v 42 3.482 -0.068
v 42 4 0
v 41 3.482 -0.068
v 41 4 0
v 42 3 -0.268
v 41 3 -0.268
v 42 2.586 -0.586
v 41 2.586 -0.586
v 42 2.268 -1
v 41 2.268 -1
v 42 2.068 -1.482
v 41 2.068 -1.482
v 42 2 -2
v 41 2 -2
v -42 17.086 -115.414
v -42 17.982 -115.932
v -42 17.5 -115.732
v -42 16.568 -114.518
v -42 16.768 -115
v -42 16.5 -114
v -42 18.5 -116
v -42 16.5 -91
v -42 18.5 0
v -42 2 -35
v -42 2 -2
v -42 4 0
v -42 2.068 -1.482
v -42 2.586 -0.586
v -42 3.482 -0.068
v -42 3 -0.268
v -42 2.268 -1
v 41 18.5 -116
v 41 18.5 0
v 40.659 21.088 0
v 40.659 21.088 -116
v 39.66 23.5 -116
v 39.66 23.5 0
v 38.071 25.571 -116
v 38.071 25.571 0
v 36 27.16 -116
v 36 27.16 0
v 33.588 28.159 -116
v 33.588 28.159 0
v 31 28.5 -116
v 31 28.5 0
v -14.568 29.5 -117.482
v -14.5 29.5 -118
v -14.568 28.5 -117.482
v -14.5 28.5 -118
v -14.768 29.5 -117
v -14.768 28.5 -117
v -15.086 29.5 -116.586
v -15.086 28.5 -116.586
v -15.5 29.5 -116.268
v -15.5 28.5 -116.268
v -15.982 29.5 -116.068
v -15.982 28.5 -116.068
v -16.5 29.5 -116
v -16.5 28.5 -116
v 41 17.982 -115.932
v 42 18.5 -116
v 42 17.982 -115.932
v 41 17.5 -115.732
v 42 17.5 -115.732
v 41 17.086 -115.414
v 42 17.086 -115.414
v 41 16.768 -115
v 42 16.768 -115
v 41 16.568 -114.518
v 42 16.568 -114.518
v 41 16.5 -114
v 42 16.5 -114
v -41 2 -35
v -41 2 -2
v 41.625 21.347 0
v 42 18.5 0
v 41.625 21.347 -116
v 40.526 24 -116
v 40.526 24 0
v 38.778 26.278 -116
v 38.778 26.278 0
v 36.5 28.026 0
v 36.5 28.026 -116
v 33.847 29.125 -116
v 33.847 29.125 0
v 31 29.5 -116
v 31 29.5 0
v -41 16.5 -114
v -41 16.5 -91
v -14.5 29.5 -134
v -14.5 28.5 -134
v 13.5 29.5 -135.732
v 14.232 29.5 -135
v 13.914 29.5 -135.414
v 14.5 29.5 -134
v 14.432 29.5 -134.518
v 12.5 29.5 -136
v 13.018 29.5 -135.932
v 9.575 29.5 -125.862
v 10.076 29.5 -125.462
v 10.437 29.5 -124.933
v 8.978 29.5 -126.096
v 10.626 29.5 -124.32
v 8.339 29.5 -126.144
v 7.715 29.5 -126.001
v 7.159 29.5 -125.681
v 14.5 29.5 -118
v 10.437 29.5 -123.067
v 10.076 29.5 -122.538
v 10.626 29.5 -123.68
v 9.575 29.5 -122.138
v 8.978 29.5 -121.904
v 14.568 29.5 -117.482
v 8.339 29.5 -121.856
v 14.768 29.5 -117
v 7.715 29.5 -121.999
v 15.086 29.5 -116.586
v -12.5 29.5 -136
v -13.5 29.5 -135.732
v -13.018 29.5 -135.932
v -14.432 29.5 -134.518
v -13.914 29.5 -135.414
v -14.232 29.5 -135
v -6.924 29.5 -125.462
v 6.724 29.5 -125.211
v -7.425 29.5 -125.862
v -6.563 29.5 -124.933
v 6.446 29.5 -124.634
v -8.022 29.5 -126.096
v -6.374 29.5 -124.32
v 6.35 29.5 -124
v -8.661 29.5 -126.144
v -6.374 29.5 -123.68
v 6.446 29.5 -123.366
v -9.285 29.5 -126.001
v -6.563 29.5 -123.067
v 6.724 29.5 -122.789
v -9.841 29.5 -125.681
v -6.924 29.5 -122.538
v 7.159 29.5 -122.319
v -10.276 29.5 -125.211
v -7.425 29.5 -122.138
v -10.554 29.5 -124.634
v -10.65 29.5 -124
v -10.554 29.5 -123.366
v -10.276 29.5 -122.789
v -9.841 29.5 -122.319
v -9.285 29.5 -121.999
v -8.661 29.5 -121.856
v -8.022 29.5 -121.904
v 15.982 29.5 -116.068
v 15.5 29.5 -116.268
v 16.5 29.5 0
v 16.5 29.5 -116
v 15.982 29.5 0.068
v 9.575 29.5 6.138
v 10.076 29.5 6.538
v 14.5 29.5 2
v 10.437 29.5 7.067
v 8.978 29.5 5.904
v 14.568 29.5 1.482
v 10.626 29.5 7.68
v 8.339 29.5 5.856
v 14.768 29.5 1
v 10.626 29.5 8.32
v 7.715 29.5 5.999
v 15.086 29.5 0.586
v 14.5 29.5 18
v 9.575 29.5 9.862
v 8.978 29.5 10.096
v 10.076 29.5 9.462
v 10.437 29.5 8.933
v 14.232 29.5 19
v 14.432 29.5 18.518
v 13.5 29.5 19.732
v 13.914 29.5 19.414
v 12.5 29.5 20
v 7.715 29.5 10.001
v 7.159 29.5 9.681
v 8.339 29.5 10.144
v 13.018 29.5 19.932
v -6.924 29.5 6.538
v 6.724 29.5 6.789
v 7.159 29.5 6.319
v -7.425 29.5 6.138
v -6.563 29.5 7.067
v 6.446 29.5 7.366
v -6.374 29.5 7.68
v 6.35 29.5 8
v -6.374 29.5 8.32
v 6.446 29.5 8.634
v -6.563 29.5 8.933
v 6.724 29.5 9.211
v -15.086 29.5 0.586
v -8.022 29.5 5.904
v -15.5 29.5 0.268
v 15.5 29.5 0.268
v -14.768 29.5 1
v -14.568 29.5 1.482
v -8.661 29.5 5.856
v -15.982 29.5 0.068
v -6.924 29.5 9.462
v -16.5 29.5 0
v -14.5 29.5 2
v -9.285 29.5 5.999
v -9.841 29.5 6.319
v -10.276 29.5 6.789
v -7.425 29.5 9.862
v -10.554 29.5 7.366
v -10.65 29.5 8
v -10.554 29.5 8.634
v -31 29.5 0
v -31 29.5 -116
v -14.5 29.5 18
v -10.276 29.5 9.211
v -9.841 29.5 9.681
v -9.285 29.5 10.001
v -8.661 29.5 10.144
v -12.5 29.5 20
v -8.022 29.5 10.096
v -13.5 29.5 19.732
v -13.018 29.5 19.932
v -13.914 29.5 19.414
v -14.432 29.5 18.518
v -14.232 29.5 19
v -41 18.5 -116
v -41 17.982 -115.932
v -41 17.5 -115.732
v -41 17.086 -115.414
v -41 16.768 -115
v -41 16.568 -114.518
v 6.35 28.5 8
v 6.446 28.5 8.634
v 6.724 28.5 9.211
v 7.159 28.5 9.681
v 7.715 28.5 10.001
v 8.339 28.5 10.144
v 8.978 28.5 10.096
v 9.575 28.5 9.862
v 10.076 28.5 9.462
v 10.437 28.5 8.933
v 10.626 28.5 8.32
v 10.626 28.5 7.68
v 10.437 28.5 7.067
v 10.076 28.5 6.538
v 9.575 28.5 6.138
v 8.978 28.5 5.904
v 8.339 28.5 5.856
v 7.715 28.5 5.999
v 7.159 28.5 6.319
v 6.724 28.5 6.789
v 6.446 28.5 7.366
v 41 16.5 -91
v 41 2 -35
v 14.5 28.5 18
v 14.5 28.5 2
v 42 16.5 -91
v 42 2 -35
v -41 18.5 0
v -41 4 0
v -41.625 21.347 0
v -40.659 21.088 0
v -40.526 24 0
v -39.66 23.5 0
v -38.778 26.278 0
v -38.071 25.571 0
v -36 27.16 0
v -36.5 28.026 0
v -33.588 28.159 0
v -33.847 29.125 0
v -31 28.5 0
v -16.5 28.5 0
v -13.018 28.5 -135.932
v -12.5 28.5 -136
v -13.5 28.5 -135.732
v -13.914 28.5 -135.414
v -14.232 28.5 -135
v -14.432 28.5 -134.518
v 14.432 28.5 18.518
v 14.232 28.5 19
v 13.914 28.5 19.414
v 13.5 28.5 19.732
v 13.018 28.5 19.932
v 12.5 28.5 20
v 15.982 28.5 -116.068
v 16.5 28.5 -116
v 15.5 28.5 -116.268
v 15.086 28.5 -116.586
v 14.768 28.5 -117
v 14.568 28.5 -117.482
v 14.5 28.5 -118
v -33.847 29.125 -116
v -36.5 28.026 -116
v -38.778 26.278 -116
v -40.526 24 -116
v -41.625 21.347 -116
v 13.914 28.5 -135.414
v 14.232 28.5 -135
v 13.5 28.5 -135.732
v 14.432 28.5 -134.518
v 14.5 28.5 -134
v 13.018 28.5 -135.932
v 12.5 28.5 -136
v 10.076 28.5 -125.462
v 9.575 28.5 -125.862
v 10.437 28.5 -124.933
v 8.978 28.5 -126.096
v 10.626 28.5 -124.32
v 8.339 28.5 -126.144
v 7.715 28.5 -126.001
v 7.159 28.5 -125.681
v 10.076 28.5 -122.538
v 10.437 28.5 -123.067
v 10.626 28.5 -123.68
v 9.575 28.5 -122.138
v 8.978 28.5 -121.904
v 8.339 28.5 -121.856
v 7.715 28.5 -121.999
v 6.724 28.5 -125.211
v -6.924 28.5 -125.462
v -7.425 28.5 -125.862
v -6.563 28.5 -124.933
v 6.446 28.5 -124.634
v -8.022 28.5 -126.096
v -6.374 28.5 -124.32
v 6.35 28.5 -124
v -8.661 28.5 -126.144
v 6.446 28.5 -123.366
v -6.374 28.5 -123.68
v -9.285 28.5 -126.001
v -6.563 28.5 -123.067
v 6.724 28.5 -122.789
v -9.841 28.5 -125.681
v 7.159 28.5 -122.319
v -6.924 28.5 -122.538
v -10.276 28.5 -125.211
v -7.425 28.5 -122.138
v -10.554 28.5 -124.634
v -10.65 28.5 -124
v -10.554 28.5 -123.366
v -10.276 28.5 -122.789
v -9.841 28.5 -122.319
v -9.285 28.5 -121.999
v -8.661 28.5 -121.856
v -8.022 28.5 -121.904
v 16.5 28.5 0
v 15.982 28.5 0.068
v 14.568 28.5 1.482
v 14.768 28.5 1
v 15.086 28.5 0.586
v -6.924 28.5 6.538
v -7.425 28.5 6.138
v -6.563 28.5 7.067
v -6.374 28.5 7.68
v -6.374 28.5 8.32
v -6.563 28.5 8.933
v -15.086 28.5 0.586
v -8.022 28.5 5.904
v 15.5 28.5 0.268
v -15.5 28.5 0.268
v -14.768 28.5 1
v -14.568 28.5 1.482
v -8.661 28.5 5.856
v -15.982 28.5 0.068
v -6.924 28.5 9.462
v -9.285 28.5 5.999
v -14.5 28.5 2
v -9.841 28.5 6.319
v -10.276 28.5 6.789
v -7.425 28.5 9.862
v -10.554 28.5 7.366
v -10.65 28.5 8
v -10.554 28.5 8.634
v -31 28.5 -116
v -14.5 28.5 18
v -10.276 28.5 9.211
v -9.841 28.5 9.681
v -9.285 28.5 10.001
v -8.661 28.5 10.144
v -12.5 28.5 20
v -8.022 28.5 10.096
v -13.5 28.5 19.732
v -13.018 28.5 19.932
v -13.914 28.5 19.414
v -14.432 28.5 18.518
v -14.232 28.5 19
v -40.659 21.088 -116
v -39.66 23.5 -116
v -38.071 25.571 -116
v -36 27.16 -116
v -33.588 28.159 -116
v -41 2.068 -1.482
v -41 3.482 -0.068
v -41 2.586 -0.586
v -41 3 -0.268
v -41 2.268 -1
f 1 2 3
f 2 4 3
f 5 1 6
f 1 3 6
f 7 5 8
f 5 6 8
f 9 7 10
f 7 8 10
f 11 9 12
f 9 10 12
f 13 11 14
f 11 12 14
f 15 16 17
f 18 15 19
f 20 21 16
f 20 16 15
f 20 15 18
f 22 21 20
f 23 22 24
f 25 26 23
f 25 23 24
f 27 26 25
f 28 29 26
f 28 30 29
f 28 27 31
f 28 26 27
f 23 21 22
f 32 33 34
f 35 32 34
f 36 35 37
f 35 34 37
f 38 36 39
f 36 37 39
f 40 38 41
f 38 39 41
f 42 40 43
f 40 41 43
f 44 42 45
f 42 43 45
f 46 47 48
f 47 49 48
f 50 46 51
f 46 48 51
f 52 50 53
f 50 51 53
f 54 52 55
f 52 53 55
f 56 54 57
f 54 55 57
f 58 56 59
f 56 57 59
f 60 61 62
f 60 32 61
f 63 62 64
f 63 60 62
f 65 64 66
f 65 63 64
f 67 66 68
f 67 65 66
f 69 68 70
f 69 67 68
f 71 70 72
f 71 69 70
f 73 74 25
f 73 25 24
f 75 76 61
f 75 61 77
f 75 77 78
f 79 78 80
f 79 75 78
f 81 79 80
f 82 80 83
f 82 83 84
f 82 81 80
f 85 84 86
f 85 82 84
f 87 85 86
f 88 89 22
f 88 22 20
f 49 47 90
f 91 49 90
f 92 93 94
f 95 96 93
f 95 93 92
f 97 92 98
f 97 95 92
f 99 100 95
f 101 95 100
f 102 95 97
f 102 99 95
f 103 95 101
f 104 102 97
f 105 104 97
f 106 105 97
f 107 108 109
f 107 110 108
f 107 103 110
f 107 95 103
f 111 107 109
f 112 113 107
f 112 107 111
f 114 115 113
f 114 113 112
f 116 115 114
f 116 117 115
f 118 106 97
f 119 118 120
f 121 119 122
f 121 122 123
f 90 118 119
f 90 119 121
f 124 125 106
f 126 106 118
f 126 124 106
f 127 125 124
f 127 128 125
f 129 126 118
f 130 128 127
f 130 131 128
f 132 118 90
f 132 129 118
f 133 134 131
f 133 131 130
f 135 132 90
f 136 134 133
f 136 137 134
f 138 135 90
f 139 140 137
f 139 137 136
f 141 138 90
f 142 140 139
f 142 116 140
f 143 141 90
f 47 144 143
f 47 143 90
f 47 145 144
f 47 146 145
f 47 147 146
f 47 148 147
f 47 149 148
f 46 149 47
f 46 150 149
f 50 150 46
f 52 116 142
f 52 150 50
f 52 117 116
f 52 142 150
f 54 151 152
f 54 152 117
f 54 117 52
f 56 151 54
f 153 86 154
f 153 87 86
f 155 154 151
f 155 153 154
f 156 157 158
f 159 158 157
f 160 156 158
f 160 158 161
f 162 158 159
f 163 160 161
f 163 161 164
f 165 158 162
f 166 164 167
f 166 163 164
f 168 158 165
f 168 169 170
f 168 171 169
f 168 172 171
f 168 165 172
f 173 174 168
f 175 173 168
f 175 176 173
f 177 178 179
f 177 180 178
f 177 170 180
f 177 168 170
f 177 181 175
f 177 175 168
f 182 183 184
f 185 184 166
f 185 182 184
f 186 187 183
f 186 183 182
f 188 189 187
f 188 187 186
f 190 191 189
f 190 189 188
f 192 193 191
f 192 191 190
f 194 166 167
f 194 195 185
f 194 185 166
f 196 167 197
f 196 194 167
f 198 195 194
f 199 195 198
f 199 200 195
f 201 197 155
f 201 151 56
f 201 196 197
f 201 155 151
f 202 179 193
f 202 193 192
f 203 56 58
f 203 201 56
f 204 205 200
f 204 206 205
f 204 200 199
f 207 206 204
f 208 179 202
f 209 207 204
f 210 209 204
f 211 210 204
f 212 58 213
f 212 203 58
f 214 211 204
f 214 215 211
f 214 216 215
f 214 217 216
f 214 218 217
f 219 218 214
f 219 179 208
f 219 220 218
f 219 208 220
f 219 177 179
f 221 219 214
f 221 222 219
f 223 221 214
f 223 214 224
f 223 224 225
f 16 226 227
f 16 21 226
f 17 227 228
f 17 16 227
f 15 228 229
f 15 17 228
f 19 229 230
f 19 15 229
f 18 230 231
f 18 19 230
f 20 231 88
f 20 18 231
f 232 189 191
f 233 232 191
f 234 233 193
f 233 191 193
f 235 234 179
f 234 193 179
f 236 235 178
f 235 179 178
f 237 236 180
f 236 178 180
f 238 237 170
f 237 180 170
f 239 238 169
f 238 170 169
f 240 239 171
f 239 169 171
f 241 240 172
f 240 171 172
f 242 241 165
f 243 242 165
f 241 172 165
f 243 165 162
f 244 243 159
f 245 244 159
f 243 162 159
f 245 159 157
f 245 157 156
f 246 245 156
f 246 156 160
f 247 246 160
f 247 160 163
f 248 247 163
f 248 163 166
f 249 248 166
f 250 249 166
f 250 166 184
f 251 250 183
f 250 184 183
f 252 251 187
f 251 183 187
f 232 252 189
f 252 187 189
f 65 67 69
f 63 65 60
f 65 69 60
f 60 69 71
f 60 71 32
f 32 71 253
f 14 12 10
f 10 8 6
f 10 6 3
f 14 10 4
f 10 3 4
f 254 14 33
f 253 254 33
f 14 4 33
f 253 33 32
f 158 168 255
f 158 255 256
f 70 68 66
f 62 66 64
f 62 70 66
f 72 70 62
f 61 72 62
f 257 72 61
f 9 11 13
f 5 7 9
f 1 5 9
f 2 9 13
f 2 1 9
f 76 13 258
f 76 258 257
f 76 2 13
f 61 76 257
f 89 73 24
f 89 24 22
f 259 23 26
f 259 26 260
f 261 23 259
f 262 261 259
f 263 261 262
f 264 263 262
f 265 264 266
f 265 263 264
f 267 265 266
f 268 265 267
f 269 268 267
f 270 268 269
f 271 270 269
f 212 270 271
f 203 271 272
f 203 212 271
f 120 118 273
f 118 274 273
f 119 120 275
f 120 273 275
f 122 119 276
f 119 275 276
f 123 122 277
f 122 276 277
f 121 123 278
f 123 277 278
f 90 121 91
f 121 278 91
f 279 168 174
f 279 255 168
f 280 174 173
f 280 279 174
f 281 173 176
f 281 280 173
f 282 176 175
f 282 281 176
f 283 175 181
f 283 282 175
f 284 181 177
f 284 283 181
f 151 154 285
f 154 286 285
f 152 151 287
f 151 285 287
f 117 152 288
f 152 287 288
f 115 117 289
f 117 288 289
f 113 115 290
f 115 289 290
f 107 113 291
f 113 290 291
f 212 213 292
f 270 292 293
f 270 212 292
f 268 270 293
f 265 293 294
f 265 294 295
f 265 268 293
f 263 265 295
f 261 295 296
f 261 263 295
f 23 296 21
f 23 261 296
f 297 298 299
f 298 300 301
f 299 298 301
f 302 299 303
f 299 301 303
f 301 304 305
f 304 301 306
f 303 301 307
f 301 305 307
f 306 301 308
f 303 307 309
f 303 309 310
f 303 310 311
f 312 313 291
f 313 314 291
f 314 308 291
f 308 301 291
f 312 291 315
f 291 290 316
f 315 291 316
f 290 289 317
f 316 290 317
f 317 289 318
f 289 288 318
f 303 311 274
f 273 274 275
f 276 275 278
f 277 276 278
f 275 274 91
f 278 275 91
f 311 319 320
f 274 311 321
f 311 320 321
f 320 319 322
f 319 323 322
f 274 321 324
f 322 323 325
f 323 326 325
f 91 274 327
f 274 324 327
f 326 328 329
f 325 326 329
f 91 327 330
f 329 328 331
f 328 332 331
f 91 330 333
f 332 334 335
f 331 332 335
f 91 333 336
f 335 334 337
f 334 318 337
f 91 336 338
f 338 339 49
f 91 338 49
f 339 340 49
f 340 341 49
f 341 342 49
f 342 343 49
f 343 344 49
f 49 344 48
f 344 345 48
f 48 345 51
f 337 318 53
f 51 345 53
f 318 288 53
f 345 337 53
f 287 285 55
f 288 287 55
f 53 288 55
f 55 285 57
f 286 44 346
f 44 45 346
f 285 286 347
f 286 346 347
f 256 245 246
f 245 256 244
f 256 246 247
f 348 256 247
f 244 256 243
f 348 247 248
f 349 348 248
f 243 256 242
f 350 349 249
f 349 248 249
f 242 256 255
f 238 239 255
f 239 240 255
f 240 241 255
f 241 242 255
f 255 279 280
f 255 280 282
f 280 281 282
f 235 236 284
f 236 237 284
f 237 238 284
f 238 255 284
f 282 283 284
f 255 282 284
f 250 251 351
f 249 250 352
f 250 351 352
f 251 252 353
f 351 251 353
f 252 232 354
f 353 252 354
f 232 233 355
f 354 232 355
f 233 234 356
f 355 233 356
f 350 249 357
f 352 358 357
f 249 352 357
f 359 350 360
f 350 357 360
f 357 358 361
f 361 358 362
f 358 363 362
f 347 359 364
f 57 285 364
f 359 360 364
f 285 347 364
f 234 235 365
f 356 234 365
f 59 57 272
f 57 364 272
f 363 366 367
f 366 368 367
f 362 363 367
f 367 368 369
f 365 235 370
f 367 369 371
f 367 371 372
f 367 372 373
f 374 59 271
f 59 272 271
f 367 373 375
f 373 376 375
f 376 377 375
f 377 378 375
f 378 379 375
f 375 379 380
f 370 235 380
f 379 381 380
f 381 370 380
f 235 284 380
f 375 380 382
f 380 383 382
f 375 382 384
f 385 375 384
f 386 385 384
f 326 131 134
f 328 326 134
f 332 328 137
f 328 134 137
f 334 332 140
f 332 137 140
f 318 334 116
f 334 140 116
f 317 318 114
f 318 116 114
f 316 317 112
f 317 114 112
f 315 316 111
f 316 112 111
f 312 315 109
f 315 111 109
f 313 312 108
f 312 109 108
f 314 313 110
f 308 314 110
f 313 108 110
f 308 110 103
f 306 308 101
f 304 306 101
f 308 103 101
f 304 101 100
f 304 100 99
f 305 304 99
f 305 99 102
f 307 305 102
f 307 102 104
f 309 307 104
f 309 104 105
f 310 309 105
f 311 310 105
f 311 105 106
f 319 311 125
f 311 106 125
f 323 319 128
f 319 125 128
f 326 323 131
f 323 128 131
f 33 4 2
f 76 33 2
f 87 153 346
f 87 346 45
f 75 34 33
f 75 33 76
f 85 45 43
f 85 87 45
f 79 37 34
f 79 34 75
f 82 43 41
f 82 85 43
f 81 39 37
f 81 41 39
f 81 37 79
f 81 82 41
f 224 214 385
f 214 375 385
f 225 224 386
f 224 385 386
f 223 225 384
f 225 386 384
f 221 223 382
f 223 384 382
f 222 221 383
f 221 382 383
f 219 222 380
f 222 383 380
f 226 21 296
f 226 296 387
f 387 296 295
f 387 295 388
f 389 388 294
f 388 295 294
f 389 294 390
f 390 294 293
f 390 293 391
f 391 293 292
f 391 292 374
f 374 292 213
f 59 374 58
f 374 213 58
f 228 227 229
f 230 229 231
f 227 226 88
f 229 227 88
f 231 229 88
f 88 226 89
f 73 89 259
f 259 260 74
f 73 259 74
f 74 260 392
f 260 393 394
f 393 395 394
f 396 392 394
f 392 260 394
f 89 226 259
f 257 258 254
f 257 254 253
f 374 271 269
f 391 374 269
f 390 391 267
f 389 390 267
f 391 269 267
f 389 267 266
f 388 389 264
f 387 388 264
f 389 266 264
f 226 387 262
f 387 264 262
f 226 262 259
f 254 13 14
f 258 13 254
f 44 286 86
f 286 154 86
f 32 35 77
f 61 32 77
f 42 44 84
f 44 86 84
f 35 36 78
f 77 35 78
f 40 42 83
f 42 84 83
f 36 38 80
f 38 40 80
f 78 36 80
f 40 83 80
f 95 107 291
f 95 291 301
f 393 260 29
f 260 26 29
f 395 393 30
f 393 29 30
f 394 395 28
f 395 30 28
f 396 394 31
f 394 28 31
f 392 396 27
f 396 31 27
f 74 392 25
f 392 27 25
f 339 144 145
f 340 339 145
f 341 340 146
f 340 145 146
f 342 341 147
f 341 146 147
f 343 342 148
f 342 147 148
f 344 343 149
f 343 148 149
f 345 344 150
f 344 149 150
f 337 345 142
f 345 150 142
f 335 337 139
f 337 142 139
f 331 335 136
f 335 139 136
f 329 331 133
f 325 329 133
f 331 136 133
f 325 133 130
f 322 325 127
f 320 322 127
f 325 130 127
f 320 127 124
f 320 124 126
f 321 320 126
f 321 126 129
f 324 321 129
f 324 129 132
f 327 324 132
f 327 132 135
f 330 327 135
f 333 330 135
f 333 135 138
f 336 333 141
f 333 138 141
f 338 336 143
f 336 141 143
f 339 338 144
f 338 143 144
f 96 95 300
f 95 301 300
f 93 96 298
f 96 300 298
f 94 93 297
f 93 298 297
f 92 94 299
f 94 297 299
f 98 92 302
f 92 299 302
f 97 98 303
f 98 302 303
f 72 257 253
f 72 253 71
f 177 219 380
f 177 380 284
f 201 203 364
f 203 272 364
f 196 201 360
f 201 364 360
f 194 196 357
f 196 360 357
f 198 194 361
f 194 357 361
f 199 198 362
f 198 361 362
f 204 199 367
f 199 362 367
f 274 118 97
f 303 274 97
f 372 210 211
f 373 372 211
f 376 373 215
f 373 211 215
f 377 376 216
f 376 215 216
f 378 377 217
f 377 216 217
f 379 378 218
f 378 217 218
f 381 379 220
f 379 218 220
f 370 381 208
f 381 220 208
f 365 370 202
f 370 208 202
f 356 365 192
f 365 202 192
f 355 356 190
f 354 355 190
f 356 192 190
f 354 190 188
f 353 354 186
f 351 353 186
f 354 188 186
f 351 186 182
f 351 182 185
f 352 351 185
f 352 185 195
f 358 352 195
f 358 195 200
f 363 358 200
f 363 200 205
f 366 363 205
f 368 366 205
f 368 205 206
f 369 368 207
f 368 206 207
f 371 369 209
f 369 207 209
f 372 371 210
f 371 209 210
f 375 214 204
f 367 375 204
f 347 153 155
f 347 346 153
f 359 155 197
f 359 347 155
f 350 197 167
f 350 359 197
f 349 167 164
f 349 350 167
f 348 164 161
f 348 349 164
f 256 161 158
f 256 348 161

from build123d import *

# Parameters (mm, degrees)
BOSS_EXTRUDE1_DEPTH = 116
SKETCH2_W           = 29
SKETCH2_H           = 20
BOSS_EXTRUDE2_DEPTH = 1
CUT_EXTRUDE1_DEPTH  = 163.549223314
FILLET1_R           = 2
SKETCH4_R           = 2.15
CUT_EXTRUDE2_DEPTH  = 1


with BuildPart() as part:
    # Sketch1 → Boss-Extrude1 (new body)
    with BuildSketch(Plane.XY):
        with BuildLine():
            Line((42, -18.5), (42, 18.5))
            ThreePointArc((42, 18.5), (38.778174593, 26.278174593), (31, 29.5))
            Line((31, 29.5), (-31, 29.5))
            ThreePointArc((-31, 29.5), (-38.778174593, 26.278174593), (-42, 18.5))
            Line((-42, 18.5), (-42, -18.5))
            ThreePointArc((-42, -18.5), (-38.778174593, -26.278174593), (-31, -29.5))
            Line((-31, -29.5), (31, -29.5))
            ThreePointArc((31, -29.5), (38.778174593, -26.278174593), (42, -18.5))
        make_face()
        with BuildLine():
            ThreePointArc((-41, -18.5), (-38.071067812, -25.571067812), (-31, -28.5))
            Line((-31, -28.5), (31, -28.5))
            ThreePointArc((31, -28.5), (38.071067812, -25.571067812), (41, -18.5))
            Line((41, -18.5), (41, 18.5))
            ThreePointArc((41, 18.5), (38.071067812, 25.571067812), (31, 28.5))
            Line((31, 28.5), (-31, 28.5))
            ThreePointArc((-31, 28.5), (-38.071067812, 25.571067812), (-41, 18.5))
            Line((-41, 18.5), (-41, -18.5))
        make_face(mode=Mode.SUBTRACT)
    extrude(amount=-BOSS_EXTRUDE1_DEPTH)

    # Sketch2 → Boss-Extrude2 (add)
    with BuildSketch(Plane(origin=(0, 29.5, 0), x_dir=(1, 0, 0), z_dir=(0, 1, 0))):
        with Locations((0, -10)):
            Rectangle(SKETCH2_W, SKETCH2_H)
        with Locations((0, 126)):
            Rectangle(SKETCH2_W, SKETCH2_H)
    extrude(amount=-BOSS_EXTRUDE2_DEPTH)

    # Sketch3 → Cut-Extrude1 (cut, through all)
    with BuildSketch(Plane(origin=(42, 0, 0), x_dir=(0, 0, -1), z_dir=(1, 0, 0))):
        Polygon((0, 2), (35, 2), (91, 16.5), (116, 16.5), (116, -29.5), (0, -29.5), align=None)
    extrude(amount=-CUT_EXTRUDE1_DEPTH, mode=Mode.SUBTRACT)

    # Fillet1
    fillet1_edges = [part.edges().sort_by_distance(p)[0] for p in [
        (-41.5, 16.5, -116),
        (-14.5, 29, -136),
        (-14.5, 29, -116),
        (14.5, 29, -116),
        (14.5, 29, -136),
        (41.5, 16.5, -116),
        (-14.5, 29, 20),
        (14.5, 29, 20),
        (-14.5, 29, 0),
        (-41.5, 2, 0),
        (14.5, 29, 0),
        (41.5, 2, 0),
    ]]
    fillet(fillet1_edges, radius=FILLET1_R)

    # Sketch4 → Cut-Extrude2 (cut)
    with BuildSketch(Plane(origin=(0, 29.5, 0), x_dir=(1, 0, 0), z_dir=(0, 1, 0))):
        with Locations(Location((8.5, 124, 0), (0, 0, 180))):
            Circle(SKETCH4_R)
        with Locations(Location((-8.5, 124, 0), (0, 0, 180))):
            Circle(SKETCH4_R)
        with Locations(Location((8.5, -8, 0), (0, 0, 180))):
            Circle(SKETCH4_R)
        with Locations(Location((-8.5, -8, 0), (0, 0, 180))):
            Circle(SKETCH4_R)
    extrude(amount=-CUT_EXTRUDE2_DEPTH, mode=Mode.SUBTRACT)


solid = part.part
